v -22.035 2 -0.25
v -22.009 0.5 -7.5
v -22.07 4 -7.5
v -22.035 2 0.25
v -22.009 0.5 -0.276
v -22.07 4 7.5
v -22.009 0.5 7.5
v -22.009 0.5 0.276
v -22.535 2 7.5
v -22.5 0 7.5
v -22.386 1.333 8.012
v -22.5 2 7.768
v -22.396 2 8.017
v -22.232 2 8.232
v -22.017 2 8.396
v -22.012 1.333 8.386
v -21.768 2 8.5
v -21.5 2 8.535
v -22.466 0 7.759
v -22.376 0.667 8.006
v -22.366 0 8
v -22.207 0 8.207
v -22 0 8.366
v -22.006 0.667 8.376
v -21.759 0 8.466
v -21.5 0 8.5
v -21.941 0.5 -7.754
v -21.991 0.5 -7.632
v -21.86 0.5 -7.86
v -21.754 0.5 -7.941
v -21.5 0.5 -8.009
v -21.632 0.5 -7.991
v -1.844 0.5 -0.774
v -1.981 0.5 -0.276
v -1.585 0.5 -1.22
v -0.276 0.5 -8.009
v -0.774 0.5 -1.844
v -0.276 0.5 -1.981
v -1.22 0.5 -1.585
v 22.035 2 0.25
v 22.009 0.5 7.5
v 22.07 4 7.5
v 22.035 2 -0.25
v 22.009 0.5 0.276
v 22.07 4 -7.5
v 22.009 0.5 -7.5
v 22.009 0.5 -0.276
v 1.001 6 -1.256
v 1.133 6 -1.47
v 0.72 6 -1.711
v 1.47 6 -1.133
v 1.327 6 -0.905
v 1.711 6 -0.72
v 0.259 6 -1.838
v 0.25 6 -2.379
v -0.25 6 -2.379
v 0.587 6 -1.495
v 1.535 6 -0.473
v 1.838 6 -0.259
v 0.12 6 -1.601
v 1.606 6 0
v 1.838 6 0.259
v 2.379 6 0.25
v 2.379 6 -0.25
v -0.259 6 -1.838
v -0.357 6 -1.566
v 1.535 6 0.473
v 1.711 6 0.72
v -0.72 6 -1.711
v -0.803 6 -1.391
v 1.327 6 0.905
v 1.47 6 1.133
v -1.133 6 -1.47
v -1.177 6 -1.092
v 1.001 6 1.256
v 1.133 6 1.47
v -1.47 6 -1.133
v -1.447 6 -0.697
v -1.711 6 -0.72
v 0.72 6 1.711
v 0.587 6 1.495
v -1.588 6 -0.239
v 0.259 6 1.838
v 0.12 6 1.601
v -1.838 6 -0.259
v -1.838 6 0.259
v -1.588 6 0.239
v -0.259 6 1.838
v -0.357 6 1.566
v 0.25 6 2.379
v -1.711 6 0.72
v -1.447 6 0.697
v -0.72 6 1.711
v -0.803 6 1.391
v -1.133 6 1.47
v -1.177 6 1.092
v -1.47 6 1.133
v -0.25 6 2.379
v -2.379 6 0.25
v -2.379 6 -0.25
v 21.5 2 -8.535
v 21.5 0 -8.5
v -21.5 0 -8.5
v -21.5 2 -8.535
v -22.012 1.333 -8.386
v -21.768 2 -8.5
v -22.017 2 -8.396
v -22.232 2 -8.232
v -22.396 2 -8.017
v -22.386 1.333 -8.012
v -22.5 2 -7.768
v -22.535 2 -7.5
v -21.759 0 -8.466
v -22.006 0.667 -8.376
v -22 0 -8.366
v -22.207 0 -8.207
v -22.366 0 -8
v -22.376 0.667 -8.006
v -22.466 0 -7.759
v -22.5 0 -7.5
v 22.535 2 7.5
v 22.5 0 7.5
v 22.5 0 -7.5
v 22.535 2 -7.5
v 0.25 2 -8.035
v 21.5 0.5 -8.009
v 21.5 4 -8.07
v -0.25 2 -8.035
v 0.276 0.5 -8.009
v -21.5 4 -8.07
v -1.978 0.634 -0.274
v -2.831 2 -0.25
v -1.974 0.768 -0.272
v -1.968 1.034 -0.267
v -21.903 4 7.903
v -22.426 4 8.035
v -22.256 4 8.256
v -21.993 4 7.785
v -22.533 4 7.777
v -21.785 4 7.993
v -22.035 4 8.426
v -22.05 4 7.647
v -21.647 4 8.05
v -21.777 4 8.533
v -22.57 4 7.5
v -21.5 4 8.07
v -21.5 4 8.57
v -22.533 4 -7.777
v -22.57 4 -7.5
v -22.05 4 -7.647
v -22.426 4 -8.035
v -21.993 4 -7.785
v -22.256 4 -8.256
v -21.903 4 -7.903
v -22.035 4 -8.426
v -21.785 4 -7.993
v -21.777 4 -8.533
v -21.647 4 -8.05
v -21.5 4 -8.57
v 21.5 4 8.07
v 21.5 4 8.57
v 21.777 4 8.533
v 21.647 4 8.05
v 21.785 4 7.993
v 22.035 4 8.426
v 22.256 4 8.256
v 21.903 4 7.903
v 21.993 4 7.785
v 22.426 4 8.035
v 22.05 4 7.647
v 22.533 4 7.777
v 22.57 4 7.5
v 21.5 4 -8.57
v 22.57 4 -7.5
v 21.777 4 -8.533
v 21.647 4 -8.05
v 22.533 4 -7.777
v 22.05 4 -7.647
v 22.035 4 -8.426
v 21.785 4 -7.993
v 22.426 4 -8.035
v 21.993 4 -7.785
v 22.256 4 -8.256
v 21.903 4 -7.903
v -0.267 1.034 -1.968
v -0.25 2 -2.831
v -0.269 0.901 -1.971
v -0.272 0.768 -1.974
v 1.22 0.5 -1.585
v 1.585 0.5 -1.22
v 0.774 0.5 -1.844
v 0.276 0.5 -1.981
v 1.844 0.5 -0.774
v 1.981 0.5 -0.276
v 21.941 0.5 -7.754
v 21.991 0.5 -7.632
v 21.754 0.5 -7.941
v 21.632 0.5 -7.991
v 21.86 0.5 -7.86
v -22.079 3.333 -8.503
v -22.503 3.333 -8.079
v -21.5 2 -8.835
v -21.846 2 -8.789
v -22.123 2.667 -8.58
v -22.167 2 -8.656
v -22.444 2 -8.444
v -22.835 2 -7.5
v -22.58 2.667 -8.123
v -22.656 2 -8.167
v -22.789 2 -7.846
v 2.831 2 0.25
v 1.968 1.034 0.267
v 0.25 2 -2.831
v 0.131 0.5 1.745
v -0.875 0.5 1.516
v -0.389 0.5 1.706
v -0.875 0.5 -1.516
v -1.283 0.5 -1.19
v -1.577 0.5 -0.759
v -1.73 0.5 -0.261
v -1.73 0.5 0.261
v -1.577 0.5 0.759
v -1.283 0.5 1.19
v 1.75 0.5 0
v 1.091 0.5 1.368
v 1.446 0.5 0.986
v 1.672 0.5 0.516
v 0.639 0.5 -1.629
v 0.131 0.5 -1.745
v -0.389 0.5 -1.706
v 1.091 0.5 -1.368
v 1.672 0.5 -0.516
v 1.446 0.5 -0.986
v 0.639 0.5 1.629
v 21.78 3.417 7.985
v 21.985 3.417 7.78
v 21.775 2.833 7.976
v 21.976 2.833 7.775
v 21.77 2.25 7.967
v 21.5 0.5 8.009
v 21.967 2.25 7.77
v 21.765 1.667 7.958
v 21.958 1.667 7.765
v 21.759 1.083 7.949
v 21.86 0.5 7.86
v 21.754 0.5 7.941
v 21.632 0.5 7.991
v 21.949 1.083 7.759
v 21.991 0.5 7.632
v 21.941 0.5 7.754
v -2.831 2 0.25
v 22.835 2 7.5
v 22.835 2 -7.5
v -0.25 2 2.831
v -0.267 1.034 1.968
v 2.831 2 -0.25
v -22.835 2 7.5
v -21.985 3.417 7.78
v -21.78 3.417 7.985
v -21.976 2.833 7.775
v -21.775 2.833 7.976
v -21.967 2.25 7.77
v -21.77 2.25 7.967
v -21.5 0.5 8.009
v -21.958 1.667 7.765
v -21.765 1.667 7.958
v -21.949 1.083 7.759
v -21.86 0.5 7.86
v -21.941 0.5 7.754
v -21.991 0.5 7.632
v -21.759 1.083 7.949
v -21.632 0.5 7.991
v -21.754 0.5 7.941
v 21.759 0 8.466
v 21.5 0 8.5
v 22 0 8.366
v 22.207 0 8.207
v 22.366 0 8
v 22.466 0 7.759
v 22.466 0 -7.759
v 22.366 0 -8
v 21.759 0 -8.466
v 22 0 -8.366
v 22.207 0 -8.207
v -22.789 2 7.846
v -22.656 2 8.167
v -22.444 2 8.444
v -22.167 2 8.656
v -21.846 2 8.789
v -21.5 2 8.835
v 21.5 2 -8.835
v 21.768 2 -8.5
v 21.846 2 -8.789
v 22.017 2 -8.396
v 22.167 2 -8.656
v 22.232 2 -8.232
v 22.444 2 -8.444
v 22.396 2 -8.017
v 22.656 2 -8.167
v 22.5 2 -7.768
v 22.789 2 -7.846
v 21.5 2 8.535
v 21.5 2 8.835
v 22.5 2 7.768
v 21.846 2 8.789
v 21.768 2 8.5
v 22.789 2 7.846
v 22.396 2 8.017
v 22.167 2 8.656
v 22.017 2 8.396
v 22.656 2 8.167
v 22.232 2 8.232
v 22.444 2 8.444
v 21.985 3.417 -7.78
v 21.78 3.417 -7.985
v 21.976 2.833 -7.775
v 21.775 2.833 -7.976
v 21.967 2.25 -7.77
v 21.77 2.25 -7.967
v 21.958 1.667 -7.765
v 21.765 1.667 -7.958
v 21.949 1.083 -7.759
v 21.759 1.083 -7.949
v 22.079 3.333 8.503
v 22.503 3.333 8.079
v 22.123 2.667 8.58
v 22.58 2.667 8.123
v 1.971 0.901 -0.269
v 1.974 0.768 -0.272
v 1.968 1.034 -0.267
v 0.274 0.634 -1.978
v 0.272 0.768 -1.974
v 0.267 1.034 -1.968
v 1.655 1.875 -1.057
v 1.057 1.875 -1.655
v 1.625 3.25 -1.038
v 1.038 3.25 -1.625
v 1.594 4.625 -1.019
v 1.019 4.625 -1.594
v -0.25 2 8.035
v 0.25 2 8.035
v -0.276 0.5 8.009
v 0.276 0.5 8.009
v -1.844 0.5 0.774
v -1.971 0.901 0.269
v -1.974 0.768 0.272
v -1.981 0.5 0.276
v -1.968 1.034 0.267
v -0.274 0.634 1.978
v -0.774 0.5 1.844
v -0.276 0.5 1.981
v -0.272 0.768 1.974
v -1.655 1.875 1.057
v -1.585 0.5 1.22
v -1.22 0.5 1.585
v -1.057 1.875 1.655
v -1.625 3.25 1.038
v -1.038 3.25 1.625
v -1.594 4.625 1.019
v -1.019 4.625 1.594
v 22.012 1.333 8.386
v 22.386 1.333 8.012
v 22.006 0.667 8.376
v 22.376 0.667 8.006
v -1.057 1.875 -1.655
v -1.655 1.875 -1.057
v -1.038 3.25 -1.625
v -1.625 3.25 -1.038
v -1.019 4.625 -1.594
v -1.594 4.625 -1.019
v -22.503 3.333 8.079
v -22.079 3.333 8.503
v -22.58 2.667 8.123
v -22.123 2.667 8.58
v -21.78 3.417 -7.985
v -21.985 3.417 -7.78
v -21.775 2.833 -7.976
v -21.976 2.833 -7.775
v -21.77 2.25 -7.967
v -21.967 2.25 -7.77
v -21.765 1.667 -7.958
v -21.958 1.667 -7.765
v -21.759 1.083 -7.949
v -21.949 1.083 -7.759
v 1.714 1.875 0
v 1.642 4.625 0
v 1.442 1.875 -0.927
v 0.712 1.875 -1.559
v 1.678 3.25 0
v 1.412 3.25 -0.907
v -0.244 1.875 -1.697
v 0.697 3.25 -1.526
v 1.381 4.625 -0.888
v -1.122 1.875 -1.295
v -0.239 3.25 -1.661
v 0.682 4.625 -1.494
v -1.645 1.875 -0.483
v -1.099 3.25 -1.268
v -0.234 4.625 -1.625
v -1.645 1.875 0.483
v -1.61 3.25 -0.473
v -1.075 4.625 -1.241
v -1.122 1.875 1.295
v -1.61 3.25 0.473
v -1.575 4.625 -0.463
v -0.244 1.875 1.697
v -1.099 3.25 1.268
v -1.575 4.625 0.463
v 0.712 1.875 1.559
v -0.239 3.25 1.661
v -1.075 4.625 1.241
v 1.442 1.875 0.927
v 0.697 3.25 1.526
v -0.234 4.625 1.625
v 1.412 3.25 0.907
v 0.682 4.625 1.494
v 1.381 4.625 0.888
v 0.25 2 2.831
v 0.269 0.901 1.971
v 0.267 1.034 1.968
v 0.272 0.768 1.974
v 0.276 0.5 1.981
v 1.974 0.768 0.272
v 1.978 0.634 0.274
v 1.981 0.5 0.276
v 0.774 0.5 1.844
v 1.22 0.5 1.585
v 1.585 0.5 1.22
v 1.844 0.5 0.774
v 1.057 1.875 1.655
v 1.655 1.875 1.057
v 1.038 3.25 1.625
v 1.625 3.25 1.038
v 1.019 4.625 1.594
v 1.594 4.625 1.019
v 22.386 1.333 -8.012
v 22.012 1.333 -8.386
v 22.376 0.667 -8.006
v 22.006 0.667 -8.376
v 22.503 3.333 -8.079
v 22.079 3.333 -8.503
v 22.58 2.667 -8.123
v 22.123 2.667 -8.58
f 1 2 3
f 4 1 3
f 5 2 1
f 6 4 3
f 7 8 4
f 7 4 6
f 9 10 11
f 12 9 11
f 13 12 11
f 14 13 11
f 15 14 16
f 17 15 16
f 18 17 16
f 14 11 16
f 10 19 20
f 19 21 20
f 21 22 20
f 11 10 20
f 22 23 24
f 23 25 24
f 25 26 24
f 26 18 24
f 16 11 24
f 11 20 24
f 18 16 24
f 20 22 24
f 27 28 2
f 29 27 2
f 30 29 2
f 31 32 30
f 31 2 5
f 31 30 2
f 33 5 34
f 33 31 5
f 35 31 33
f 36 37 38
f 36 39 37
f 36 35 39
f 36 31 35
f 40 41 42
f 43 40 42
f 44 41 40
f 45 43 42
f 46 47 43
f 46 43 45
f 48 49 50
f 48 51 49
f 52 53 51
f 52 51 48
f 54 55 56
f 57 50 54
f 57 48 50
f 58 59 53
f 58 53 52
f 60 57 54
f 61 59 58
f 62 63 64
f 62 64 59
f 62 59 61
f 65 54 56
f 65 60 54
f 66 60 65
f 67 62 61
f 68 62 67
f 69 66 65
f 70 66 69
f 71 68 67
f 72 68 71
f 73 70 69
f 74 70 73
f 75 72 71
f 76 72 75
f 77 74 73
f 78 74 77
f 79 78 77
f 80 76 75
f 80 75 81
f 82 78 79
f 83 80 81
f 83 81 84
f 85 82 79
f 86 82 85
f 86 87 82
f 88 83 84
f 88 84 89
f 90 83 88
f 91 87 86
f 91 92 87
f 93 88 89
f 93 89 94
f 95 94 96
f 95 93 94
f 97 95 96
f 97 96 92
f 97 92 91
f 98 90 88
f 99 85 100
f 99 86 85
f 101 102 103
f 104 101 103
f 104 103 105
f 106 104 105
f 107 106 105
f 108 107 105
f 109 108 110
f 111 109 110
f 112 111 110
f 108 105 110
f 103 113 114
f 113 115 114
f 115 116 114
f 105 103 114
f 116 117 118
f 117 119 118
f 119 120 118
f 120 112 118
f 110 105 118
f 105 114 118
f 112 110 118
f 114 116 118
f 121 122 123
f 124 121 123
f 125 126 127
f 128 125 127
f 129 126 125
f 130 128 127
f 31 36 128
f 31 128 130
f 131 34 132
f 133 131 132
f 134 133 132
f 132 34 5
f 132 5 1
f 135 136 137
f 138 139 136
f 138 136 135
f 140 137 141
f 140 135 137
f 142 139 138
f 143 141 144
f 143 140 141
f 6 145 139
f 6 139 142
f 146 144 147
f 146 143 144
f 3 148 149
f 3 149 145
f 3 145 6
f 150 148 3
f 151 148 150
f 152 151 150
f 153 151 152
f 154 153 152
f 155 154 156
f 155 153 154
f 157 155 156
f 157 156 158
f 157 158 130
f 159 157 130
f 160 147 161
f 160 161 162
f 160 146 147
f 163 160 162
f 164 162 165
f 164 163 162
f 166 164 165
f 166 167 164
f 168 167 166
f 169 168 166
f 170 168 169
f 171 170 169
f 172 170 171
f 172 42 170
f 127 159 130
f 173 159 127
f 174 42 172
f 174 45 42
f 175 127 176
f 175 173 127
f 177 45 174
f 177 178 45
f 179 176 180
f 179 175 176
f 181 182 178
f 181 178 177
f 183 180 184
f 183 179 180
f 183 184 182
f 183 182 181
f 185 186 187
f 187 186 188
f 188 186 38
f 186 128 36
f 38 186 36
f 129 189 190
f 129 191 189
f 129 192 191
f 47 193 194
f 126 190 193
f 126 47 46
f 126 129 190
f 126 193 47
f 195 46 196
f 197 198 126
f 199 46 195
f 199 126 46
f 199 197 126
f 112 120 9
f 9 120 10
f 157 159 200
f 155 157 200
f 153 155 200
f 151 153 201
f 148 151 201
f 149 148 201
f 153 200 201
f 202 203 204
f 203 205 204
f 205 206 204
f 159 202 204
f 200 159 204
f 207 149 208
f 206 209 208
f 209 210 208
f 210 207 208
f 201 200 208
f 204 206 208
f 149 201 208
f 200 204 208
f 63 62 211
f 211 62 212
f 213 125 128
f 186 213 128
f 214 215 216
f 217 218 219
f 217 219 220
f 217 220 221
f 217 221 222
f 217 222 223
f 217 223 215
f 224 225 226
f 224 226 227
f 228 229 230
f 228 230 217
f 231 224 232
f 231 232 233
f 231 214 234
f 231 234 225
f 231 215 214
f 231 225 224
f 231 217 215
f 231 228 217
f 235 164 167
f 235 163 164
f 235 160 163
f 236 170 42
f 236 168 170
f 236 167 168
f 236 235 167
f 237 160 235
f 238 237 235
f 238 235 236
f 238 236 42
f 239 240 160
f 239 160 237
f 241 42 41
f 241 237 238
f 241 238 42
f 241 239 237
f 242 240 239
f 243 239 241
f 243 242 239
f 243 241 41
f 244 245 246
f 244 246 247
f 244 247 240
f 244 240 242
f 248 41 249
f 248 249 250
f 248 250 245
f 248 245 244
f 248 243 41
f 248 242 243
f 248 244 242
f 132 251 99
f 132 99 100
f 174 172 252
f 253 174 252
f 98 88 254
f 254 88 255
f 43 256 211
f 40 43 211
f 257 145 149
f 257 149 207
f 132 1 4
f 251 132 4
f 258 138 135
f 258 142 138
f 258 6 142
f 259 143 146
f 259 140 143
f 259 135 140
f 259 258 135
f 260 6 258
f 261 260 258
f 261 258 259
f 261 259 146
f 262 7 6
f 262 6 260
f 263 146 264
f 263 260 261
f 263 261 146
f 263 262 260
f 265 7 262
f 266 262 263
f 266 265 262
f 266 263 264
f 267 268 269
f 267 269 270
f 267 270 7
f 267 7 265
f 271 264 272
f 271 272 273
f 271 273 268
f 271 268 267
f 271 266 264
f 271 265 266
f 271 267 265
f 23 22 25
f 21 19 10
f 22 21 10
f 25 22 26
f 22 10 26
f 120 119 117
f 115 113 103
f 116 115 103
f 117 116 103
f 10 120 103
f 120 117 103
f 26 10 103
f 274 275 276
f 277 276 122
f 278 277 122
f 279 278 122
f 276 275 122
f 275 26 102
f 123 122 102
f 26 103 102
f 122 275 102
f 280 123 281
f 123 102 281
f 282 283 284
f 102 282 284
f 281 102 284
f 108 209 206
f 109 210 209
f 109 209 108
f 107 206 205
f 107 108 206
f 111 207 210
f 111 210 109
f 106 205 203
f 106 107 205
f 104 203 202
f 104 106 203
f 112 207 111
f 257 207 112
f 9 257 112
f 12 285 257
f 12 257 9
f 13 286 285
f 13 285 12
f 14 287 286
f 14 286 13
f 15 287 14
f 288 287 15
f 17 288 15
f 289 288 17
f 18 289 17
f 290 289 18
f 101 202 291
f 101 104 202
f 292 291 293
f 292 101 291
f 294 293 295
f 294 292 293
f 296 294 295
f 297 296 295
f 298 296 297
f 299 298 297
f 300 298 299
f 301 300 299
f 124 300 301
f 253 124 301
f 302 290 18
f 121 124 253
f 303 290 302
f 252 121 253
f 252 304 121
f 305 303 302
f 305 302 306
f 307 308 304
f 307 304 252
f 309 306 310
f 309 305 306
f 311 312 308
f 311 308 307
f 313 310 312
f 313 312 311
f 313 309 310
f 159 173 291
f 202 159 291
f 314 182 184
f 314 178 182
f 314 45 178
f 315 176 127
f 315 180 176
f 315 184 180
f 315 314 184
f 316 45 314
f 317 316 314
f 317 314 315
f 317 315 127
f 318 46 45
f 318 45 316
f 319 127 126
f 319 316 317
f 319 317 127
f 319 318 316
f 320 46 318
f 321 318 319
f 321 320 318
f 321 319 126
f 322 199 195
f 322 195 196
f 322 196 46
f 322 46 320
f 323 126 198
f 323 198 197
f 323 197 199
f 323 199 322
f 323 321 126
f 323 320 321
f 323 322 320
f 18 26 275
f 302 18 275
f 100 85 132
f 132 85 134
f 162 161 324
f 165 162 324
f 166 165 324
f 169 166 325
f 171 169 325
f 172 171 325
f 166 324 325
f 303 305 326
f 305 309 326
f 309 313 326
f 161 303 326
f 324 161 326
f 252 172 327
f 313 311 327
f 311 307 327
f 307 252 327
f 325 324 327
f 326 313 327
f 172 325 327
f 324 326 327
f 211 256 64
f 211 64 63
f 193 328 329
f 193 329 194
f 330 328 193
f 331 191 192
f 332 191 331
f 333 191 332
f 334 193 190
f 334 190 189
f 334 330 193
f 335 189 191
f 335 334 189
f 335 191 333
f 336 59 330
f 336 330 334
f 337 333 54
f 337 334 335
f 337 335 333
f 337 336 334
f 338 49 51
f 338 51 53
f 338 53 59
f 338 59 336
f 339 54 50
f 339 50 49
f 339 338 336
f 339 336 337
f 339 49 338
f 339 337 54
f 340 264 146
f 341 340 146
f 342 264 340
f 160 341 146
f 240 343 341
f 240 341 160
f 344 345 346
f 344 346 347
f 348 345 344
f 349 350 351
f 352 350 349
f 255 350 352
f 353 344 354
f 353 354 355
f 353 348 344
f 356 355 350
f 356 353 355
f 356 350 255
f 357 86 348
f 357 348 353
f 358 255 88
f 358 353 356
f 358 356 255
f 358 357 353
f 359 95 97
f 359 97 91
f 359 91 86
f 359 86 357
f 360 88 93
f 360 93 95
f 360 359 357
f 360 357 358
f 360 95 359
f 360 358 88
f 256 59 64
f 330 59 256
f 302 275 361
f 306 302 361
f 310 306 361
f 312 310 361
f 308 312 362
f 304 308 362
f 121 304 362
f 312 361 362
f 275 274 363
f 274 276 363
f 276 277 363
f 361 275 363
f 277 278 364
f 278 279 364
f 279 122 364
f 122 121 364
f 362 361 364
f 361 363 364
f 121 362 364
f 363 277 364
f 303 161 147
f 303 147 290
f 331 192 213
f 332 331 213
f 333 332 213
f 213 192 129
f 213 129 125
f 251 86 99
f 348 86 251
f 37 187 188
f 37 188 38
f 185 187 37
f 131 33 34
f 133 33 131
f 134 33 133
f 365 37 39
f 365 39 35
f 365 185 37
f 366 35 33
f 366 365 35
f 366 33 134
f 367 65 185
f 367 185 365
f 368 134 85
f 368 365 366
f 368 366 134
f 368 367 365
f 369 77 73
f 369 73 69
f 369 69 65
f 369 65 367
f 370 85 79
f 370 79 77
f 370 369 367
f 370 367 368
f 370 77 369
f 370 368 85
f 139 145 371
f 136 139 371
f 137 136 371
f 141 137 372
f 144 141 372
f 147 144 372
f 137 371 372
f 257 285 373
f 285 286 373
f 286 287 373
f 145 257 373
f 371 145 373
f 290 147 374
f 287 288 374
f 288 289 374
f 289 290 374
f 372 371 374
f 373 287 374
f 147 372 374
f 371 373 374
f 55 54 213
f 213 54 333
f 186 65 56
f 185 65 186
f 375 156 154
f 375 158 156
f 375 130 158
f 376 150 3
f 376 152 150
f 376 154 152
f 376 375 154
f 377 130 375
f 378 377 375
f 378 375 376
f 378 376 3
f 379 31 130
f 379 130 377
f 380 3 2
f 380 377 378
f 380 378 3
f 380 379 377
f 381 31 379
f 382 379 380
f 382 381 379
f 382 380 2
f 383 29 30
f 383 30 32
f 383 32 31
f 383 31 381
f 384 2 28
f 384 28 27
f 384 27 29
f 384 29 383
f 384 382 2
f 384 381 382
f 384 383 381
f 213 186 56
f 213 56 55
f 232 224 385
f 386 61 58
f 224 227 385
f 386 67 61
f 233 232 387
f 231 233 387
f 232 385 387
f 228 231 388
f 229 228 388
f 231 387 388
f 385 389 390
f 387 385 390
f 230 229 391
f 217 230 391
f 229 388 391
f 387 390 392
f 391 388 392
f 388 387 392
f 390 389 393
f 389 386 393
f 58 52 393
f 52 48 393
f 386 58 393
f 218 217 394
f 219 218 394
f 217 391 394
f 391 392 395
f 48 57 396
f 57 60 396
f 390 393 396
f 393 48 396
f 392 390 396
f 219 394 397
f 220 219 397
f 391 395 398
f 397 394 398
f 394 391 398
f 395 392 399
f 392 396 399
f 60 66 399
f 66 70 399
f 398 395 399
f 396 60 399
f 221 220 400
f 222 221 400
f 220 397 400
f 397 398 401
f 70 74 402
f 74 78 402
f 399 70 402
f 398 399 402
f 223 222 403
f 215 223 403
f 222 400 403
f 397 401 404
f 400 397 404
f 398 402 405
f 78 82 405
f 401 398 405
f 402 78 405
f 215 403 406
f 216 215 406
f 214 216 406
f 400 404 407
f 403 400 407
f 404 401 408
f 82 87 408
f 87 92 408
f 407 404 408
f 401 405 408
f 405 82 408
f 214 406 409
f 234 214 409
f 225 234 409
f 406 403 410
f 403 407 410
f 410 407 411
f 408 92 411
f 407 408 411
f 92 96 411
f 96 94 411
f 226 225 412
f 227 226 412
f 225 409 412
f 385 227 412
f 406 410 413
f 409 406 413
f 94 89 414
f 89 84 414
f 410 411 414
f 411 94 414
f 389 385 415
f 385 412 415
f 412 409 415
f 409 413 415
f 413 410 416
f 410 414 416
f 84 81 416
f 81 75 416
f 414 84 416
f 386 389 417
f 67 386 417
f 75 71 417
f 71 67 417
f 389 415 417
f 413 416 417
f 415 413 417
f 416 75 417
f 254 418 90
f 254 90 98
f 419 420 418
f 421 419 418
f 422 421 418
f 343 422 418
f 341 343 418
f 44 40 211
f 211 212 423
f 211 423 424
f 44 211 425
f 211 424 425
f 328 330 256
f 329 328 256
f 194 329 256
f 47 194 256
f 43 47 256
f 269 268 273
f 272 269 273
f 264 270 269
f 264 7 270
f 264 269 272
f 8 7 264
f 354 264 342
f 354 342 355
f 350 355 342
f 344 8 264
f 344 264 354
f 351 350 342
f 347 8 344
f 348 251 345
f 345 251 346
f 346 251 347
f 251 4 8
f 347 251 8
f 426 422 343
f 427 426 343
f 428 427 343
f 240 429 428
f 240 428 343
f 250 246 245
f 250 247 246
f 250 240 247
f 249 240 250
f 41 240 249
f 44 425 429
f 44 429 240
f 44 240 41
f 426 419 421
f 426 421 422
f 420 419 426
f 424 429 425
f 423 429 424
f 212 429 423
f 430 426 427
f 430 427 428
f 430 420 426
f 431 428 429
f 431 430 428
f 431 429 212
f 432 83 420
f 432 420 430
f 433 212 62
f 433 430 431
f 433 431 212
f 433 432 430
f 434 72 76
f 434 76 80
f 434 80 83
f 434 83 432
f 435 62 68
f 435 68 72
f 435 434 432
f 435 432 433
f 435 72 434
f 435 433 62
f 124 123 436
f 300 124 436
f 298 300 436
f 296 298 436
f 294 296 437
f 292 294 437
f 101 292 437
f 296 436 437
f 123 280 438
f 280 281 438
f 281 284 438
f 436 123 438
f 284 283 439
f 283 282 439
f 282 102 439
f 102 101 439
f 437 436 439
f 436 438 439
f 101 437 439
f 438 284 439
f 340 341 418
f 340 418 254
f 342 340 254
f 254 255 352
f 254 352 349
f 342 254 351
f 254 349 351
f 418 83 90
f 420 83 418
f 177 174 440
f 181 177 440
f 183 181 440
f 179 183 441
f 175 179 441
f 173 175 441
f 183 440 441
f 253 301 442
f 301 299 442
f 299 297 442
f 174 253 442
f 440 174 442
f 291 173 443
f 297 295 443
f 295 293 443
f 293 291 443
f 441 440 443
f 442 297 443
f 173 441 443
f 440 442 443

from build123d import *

# Parameters (mm, degrees)
BOSS_EXTRUDE1_DEPTH = 4
BOSS_EXTRUDE1_DRAFT = -1
SHELL1_T            = -0.5
SKETCH2_R           = 2
BOSS_EXTRUDE2_DEPTH = 5.5
BOSS_EXTRUDE2_TAPER = 1.5
CIRPATTERN1_COUNT   = 4
SKETCH4_R           = 1.605977431
CUT_EXTRUDE1_DEPTH  = 5.5
CUT_EXTRUDE1_DRAFT  = 1.5
RIB3_START          = -22.069744096
RIB3_DEPTH          = 20.231981802
RIB3_START_2        = 1.837762294
RIB3_2_DEPTH        = 20.231981802
RIB3_START_3        = -8.069744096
RIB3_3_DEPTH        = 6.231981802
RIB3_4_DEPTH        = 6.231981802


with BuildPart() as part:
    # Sketch1 → Boss-Extrude1 (with draft: the straight prism first)
    with BuildSketch(Plane(origin=(0, 0, 0), x_dir=(1, 0, 0), z_dir=(0, 1, 0))):
        with BuildLine():
            Line((-21.5, -8.5), (21.5, -8.5))
            ThreePointArc((21.5, -8.5), (22.207106781, -8.207106781), (22.5, -7.5))
            Line((22.5, -7.5), (22.5, 7.5))
            ThreePointArc((22.5, 7.5), (22.207106781, 8.207106781), (21.5, 8.5))
            Line((21.5, 8.5), (-21.5, 8.5))
            ThreePointArc((-21.5, 8.5), (-22.207106781, 8.207106781), (-22.5, 7.5))
            Line((-22.5, 7.5), (-22.5, -7.5))
            ThreePointArc((-22.5, -7.5), (-22.207106781, -8.207106781), (-21.5, -8.5))
        make_face()
    extrude(amount=BOSS_EXTRUDE1_DEPTH)
    # Boss-Extrude1: the draft: its side faces are tilted about the plane it starts from
    boss_extrude1_sides = [part.faces().sort_by_distance(p)[0] for p in [
        (0, 2, 8.5),
        (22.207106781, 2, 8.207106781),
        (22.5, 2, 0),
        (22.207106781, 2, -8.207106781),
        (0, 2, -8.5),
        (-22.207106781, 2, -8.207106781),
        (-22.5, 2, 0),
        (-22.207106781, 2, 8.207106781),
    ]]
    draft(boss_extrude1_sides, Plane(origin=(0, 0, 0), x_dir=(1, 0, 0), z_dir=(0, 1, 0)), BOSS_EXTRUDE1_DRAFT)

    # Shell1
    shell1_openings = [part.faces().sort_by_distance(p)[0] for p in [
        (0, 4, 0),
    ]]
    offset(amount=SHELL1_T, openings=shell1_openings, kind=Kind.INTERSECTION)

    # Sketch2 → Boss-Extrude2 (add)
    with BuildSketch(Plane(origin=(0, 0.5, 0), x_dir=(1, 0, 0), z_dir=(0, 1, 0))):
        Circle(SKETCH2_R)
    extrude(amount=BOSS_EXTRUDE2_DEPTH, taper=BOSS_EXTRUDE2_TAPER)

    # Rib2: read off the stored shape, not the designer's step
    # Rib2: loft between two sections, ruled curve by curve
    rib2_from = [
        Edge.make_line((1.837762394, 6, 0.25938699), (2.378960183, 6, 0.25)),
        Edge.make_line((1.837762394, 6, -0.25938699), (2.378960183, 6, -0.25)),
        Edge.make_line((2.378960183, 6, -0.25), (2.378960183, 6, 0.25)),
        Edge.make_line((1.837762394, 6, -0.25938699), (1.837762394, 6, 0.25938699)),
    ]
    rib2_to = [
        Edge.make_line((1.982009028, 0.5, 0.267656891), (3, 0.5, 0.25)),
        Edge.make_line((1.982009028, 0.5, -0.267656891), (3, 0.5, -0.25)),
        Edge.make_line((3, 0.5, -0.25), (3, 0.5, 0.25)),
        Edge.make_line((1.982009028, 0.5, -0.267656891), (1.982009028, 0.5, 0.267656891)),
    ]
    rib2 = Solid(Shell([*[Face.make_surface_from_curves(rib2_from[k], rib2_to[k]) for k in range(4)], Face(Wire(rib2_from)), Face(Wire(rib2_to))]))
    add(rib2)

    # CirPattern1: Rib2 ×4 about axis
    cirpattern1_axis = Axis((0, 0, 0), (0, 1, 0))
    for i in range(1, CIRPATTERN1_COUNT):
        add(rib2.rotate(cirpattern1_axis, i * 360 / CIRPATTERN1_COUNT))


with BuildPart() as cut_extrude1_tool:
    # Sketch4 → Cut-Extrude1 (with draft: the straight prism first)
    with BuildSketch(Plane(origin=(0, 6, 0), x_dir=(1, 0, 0), z_dir=(0, 1, 0))):
        Circle(SKETCH4_R)
    extrude(amount=-CUT_EXTRUDE1_DEPTH)
    # Cut-Extrude1: the draft: its side faces are tilted about the plane it starts from
    cut_extrude1_sides = [cut_extrude1_tool.faces().sort_by_distance(p)[0] for p in [
        (-1.605977431, 3.25, 0),
    ]]
    draft(cut_extrude1_sides, Plane(origin=(0, 6, 0), x_dir=(1, 0, 0), z_dir=(0, 1, 0)), CUT_EXTRUDE1_DRAFT)


with BuildPart() as part_1:
    add(part.part)

    # Cut-Extrude1: cut by cut_extrude1_tool
    add(cut_extrude1_tool.part, mode=Mode.SUBTRACT)

    # Rib3: read off the stored shape, not the designer's step
    # Rib3 outline → Rib3 (add)
    with BuildSketch(Plane.YZ.offset(RIB3_START)):
        Polygon((0.5, -0.276182597), (2, -0.25), (2, 0.25), (0.5, 0.276182597), align=None)
    extrude(amount=RIB3_DEPTH)

    # Rib3 2 outline → Rib3 2 (add)
    with BuildSketch(Plane.YZ.offset(RIB3_START_2)):
        Polygon((0.5, -0.276182597), (2, -0.25), (2, 0.25), (0.5, 0.276182597), align=None)
    extrude(amount=RIB3_2_DEPTH)

    # Rib3 3 outline → Rib3 3 (add)
    with BuildSketch(Plane.XY.offset(RIB3_START_3)):
        Polygon((0.276182597, 0.5), (0.25, 2), (-0.25, 2), (-0.276182597, 0.5), align=None)
    extrude(amount=RIB3_3_DEPTH)

    # Rib3 4 outline → Rib3 4 (add)
    with BuildSketch(Plane.XY.offset(RIB3_START_2)):
        Polygon((0.276182597, 0.5), (0.25, 2), (-0.25, 2), (-0.276182597, 0.5), align=None)
    extrude(amount=RIB3_4_DEPTH)

    # Sweep1: sweep along a path in Sketch8
    with BuildLine(Plane(origin=(0, 2, 0), x_dir=(-1, 0, 0), z_dir=(0, -1, 0))) as sweep1_path:
        Line((22.56982026, 7.5), (22.56982026, -7.5))
        ThreePointArc((22.56982026, -7.5), (22.25647716, -8.25647716), (21.5, -8.56982026))
        Line((21.5, -8.56982026), (-21.5, -8.56982026))
        ThreePointArc((-21.5, -8.56982026), (-22.25647716, -8.25647716), (-22.56982026, -7.5))
        Line((-22.56982026, -7.5), (-22.56982026, 7.5))
        ThreePointArc((-22.56982026, 7.5), (-22.25647716, 8.25647716), (-21.5, 8.56982026))
        Line((-21.5, 8.56982026), (21.5, 8.56982026))
        ThreePointArc((21.5, 8.56982026), (22.25647716, 8.25647716), (22.56982026, 7.5))
    # Sketch5 → Sweep1 (sweep)
    with BuildSketch(Plane(origin=(0, 0, 0), x_dir=(0, 0, -1), z_dir=(1, 0, 0))):
        Polygon((-8.83491013, 2), (-8.56982026, 4), (-8.53491013, 2), align=None)
    sweep(path=sweep1_path.line)


solid = part_1.part
